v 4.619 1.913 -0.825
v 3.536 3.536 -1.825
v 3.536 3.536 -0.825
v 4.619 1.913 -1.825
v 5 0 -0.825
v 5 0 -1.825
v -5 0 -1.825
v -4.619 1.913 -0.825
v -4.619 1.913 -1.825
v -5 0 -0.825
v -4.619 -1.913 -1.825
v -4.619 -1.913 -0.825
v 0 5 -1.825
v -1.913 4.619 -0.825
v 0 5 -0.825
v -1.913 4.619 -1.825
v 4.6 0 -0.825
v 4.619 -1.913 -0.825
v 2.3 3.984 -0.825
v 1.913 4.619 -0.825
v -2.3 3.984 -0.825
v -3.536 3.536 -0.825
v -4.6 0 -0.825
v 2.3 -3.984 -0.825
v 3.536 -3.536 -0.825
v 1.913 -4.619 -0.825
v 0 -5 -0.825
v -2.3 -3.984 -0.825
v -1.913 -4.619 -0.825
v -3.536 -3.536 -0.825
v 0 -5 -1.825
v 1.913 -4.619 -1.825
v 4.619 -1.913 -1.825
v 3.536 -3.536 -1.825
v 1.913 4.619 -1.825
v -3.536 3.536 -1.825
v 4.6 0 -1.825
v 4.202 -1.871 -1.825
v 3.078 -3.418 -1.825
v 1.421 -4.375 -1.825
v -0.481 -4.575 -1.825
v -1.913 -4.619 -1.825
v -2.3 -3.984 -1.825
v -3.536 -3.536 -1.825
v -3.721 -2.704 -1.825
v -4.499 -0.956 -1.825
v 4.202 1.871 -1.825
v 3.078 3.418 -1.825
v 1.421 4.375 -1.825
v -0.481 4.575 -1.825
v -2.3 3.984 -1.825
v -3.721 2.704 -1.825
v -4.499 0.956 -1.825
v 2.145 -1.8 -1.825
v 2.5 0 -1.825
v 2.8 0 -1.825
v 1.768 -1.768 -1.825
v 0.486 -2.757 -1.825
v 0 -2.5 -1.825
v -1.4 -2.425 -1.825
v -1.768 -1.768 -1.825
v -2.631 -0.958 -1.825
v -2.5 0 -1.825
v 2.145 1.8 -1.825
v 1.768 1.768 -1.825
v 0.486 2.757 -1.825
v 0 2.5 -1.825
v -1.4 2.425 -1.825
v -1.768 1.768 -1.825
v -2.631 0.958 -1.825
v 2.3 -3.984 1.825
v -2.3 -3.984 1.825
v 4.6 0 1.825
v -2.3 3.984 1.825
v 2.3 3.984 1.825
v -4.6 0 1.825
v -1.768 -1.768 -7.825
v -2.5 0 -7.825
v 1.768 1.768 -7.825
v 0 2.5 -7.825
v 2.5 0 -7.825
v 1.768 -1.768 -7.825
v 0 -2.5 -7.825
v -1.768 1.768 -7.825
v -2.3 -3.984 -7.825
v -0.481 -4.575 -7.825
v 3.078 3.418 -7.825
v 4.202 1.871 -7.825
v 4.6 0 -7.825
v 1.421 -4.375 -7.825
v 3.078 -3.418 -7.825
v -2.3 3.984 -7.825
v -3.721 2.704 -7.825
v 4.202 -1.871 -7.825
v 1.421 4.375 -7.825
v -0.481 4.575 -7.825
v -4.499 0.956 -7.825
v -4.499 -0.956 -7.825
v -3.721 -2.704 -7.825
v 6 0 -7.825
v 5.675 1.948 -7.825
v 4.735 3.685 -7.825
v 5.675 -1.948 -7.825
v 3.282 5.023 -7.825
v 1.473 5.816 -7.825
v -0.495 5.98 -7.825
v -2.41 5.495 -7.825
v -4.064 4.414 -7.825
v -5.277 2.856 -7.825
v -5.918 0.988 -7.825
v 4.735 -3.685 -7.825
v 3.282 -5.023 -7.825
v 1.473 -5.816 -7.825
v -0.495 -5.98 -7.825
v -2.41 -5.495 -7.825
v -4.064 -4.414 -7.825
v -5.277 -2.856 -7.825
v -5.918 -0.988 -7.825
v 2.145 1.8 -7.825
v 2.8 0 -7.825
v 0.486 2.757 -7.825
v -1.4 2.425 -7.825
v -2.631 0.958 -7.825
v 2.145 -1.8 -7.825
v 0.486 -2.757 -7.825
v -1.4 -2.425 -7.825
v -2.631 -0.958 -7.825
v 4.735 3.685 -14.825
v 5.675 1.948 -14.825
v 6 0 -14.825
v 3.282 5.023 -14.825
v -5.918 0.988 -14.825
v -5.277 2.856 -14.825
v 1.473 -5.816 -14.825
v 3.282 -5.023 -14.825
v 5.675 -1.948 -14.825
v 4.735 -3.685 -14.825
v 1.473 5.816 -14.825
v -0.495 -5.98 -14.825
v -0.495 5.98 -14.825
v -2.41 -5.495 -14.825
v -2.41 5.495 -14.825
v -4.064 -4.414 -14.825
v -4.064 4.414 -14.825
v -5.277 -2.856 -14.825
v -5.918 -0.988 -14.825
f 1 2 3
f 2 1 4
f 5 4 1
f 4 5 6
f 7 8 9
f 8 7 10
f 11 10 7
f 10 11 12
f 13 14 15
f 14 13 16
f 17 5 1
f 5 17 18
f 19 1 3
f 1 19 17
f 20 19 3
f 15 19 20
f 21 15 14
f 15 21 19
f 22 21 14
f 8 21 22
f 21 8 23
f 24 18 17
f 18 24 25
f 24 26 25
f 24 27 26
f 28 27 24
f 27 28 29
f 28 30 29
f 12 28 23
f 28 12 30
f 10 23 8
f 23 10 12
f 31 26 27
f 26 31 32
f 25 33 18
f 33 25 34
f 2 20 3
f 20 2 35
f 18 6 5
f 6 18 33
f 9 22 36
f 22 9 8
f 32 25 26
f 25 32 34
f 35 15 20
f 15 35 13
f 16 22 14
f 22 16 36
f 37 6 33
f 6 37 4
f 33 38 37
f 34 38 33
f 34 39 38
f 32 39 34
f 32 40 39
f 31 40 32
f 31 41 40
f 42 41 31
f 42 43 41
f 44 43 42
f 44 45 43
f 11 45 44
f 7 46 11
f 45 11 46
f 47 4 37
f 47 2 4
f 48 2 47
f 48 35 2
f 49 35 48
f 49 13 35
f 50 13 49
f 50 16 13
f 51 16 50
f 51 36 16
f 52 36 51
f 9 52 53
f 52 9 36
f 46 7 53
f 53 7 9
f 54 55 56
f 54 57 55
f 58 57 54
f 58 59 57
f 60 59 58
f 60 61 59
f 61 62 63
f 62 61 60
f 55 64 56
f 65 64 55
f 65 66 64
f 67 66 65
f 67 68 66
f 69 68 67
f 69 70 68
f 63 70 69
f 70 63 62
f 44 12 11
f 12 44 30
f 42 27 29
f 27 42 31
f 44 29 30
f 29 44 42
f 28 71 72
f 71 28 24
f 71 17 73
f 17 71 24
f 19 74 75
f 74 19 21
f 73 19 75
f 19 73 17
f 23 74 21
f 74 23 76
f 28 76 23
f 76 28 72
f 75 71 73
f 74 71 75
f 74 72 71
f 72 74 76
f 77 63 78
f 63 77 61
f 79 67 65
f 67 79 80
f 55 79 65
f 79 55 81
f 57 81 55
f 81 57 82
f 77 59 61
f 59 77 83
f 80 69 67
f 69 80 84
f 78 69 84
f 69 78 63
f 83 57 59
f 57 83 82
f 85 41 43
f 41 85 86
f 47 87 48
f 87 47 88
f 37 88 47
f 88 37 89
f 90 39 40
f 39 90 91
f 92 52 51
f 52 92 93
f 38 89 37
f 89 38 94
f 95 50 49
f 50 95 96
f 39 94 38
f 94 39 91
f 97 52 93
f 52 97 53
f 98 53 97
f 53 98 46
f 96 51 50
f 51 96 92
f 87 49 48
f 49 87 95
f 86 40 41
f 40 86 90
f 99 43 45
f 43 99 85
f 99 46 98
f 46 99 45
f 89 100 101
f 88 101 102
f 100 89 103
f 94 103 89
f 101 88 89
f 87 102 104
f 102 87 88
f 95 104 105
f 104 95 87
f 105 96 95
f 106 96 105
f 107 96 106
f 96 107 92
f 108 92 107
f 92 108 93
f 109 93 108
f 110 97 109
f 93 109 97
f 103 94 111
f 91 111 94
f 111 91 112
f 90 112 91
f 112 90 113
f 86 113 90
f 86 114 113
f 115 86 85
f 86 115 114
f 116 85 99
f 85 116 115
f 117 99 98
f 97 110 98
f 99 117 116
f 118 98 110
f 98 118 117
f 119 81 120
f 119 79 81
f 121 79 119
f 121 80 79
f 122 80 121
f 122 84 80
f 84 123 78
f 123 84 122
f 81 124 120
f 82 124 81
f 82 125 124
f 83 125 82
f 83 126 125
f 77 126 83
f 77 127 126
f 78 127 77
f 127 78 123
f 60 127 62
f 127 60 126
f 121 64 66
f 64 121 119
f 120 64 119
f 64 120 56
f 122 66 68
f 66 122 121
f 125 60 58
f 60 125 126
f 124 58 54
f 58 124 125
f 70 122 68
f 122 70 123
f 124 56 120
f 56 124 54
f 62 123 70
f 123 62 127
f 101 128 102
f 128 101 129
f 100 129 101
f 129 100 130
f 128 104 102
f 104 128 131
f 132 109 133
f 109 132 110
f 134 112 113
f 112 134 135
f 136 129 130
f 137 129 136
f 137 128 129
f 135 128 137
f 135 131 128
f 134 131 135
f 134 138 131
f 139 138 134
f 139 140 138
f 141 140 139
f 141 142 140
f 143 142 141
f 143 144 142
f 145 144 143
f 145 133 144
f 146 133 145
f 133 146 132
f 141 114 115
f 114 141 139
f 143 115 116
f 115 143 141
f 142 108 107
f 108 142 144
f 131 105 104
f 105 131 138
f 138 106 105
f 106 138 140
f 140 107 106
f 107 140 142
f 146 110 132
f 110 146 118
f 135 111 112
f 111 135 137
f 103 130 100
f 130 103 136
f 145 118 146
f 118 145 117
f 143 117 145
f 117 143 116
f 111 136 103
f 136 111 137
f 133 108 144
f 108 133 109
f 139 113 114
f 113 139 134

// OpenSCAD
// Parameters
shaft_diameter_mm = 5; //[2.5:10:0.1]
length_mm = 10; //[5:20:0.5]
head_diameter_mm = 9.2; //[4.6:18.4:0.1]
head_height_mm = 3.65; //[1.8:7.3:0.05]
overlap_mm = 1; //[0.5:2:0.1]
washer_outer_diameter_mm = 10; //[6:20:0.1]
washer_thickness_mm = 1; //[0.5:3:0.1]
washer_hole_diameter_mm = 5.5; //[5.1:7:0.1]
spacer_height_mm = 6; //[3:15:0.5]
spacer_wall_mm = 1.8; //[0.9:3.6:0.1]
spacer_clearance_diameter_mm = 5.6; //[5.1:7:0.1]
buzzer_diameter_mm = 12; //[6:24:0.5]
buzzer_height_mm = 7; //[3.5:14:0.5]

// Screw and Washer - complete geometry
module screw_and_washer() {
  color("DimGray") {
    // Hex Head
    translate([0, 0, 0])
      cylinder(h=head_height_mm, r=head_diameter_mm/2, center=true, $fn=6);
    // Threaded Shaft
    translate([0, 0, -head_height_mm/2 - length_mm/2 + overlap_mm])
      cylinder(h=length_mm, r=shaft_diameter_mm/2, center=true);
    // Washer
    difference() {
      translate([0, 0, -head_height_mm/2 - washer_thickness_mm/2 + overlap_mm])
        cylinder(h=washer_thickness_mm, r=washer_outer_diameter_mm/2, center=true);
      translate([0, 0, -head_height_mm/2 - washer_thickness_mm/2 + overlap_mm])
        cylinder(h=washer_thickness_mm + 2*overlap_mm, r=washer_hole_diameter_mm/2, center=true);
    }
  }
}

// PCB Spacer - complete geometry
module pcb_spacer() {
  color("Silver") {
    difference() {
      translate([0, 0, -head_height_mm/2 - washer_thickness_mm - spacer_height_mm/2 + overlap_mm])
        cylinder(h=spacer_height_mm, r=spacer_clearance_diameter_mm/2 + spacer_wall_mm, center=true);
      translate([0, 0, -head_height_mm/2 - washer_thickness_mm - spacer_height_mm/2 + overlap_mm])
        cylinder(h=spacer_height_mm + 2*overlap_mm, r=spacer_clearance_diameter_mm/2, center=true);
    }
  }
}

// Buzzer - complete geometry
module buzzer() {
  color("Black") {
    translate([0, 0, -head_height_mm/2 - washer_thickness_mm - spacer_height_mm - buzzer_height_mm/2 + overlap_mm])
      cylinder(h=buzzer_height_mm, r=buzzer_diameter_mm/2, center=true);
  }
}

// Assembly
module assembly() {
  screw_and_washer();
  pcb_spacer();
  buzzer();
}

assembly();
